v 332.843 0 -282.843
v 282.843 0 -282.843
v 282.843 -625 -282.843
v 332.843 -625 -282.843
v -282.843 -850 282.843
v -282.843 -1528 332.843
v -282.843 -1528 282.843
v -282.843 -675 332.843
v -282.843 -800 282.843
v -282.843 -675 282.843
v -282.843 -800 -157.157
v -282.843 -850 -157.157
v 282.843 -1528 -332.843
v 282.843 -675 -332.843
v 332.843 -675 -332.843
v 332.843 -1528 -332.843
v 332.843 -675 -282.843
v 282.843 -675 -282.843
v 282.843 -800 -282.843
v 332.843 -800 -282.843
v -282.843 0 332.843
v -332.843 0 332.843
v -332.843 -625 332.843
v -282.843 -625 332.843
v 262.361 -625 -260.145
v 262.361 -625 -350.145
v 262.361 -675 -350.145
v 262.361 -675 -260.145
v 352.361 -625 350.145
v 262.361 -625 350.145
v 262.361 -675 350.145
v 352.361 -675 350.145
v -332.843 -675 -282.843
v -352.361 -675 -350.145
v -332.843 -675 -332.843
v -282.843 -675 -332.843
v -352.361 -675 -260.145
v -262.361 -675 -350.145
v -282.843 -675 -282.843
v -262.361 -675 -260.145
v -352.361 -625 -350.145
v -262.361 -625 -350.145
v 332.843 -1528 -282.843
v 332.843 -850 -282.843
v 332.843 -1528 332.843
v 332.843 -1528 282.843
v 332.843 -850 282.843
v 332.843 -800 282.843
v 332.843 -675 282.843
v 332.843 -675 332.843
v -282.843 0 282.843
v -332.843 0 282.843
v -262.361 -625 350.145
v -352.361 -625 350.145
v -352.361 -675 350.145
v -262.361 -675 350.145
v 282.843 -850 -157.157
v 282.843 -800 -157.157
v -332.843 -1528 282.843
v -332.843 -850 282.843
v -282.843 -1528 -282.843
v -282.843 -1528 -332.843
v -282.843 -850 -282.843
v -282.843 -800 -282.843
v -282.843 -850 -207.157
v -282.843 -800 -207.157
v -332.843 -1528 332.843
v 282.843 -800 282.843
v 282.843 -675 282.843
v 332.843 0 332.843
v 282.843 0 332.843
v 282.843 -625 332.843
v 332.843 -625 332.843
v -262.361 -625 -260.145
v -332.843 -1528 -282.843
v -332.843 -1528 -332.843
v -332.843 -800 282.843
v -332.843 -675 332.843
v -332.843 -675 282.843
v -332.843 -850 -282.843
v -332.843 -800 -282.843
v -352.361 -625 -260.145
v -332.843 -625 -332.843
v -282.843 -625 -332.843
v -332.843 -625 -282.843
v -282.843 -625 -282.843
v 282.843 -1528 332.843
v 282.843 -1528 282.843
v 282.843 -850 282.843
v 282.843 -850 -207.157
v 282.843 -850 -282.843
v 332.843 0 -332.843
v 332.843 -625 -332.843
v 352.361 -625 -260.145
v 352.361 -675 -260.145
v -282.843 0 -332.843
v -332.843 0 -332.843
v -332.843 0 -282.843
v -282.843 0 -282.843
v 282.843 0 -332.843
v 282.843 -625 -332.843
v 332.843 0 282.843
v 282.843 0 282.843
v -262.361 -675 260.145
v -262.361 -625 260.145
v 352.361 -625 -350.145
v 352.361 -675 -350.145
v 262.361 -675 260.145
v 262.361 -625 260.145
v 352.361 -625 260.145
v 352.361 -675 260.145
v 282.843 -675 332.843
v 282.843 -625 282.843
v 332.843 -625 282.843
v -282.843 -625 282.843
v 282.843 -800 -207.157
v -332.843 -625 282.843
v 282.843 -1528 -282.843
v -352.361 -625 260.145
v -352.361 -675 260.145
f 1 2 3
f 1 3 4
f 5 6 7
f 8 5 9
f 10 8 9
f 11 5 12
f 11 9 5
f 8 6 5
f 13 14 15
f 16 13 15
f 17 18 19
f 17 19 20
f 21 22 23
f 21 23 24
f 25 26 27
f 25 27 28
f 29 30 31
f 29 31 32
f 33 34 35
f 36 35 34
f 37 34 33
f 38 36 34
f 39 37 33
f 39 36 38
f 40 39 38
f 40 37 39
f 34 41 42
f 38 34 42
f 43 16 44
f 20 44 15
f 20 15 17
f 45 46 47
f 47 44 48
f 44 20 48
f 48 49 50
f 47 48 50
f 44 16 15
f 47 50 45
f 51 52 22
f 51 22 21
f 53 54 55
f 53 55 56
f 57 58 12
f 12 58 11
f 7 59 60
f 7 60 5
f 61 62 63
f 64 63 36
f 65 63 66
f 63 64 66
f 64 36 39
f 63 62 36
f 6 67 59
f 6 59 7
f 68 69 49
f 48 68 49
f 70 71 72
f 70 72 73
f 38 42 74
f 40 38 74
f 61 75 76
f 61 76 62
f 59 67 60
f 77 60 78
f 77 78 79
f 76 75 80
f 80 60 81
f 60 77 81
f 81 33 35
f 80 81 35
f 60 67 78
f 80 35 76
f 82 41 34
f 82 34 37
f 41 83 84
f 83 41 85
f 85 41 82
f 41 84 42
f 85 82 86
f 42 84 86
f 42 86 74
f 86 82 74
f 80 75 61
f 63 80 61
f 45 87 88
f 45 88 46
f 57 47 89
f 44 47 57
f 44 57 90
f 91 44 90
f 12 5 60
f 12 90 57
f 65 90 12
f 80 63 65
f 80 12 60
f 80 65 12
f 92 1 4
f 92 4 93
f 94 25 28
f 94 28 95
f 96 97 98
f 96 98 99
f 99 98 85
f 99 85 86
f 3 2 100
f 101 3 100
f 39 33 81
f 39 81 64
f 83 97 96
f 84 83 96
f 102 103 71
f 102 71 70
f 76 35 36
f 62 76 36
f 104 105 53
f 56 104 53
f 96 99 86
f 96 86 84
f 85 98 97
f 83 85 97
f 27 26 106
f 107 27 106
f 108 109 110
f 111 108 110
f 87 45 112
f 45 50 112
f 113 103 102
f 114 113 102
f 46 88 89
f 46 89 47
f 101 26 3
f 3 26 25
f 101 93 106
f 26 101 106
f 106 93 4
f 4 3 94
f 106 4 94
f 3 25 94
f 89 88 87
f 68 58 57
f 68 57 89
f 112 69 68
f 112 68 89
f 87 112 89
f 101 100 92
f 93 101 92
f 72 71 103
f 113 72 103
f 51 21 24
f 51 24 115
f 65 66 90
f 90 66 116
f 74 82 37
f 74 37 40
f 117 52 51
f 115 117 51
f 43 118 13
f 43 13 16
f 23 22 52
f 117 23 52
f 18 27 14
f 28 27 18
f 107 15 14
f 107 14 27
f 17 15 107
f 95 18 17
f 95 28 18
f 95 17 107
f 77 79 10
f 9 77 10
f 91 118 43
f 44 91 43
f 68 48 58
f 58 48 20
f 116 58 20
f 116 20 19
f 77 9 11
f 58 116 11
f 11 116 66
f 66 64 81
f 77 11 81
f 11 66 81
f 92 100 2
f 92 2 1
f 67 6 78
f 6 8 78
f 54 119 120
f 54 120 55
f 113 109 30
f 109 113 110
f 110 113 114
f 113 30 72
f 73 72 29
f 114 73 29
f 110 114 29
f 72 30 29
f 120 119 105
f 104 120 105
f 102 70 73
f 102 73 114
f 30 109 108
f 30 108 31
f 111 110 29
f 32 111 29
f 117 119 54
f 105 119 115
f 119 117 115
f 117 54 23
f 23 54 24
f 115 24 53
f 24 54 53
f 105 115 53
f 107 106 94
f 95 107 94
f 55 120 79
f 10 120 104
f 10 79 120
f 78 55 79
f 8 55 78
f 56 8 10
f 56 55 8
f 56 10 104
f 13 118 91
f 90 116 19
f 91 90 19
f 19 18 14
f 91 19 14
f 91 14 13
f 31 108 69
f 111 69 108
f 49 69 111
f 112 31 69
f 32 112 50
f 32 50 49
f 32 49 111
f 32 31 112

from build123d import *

# Parameters (mm, degrees)
CROQUIS1_W                = 50
CROQUIS1_H                = 50
SALIENTE_EXTRUIR1_DEPTH   = 625
SALIENTE_EXTRUIR1_2_DEPTH = 625
SALIENTE_EXTRUIR1_3_DEPTH = 625
SALIENTE_EXTRUIR1_4_DEPTH = 625
CROQUIS2_W                = 90
CROQUIS2_H                = 90
SALIENTE_EXTRUIR2_DEPTH   = 50
CROQUIS4_W                = 50
CROQUIS4_H                = 50
SALIENTE_EXTRUIR3_DEPTH   = 853
SALIENTE_EXTRUIR4_DEPTH   = 50


with BuildPart() as part:
    # Croquis1 → Saliente-Extruir1 (new body)
    with BuildSketch(Plane(origin=(0, 0, 0), x_dir=(1, 0, 0), z_dir=(0, 1, 0))):
        with Locations((-307.842712475, 307.842712475)):
            Rectangle(CROQUIS1_W, CROQUIS1_H)
    extrude(amount=-SALIENTE_EXTRUIR1_DEPTH)



with BuildPart() as body_2:
    # Croquis1 → Saliente-Extruir1 2 (new body)
    with BuildSketch(Plane(origin=(0, 0, 0), x_dir=(1, 0, 0), z_dir=(0, 1, 0))):
        with Locations((307.842712475, 307.842712475)):
            Rectangle(CROQUIS1_W, CROQUIS1_H)
    extrude(amount=-SALIENTE_EXTRUIR1_2_DEPTH)


with BuildPart() as body_3:
    # Croquis1 → Saliente-Extruir1 3 (new body)
    with BuildSketch(Plane(origin=(0, 0, 0), x_dir=(1, 0, 0), z_dir=(0, 1, 0))):
        with Locations((-307.842712475, -307.842712475)):
            Rectangle(CROQUIS1_W, CROQUIS1_H)
    extrude(amount=-SALIENTE_EXTRUIR1_3_DEPTH)


with BuildPart() as body_4:
    # Croquis1 → Saliente-Extruir1 4 (new body)
    with BuildSketch(Plane(origin=(0, 0, 0), x_dir=(1, 0, 0), z_dir=(0, 1, 0))):
        with Locations((307.842712475, -307.842712475)):
            Rectangle(CROQUIS1_W, CROQUIS1_H)
    extrude(amount=-SALIENTE_EXTRUIR1_4_DEPTH)


with BuildPart() as part_1:
    add(part.part)

    add(body_2.part)  # Saliente-Extruir2 merges body 2

    add(body_3.part)  # Saliente-Extruir2 merges body 3

    add(body_4.part)  # Saliente-Extruir2 merges body 4
    # Croquis2 → Saliente-Extruir2 (add)
    with BuildSketch(Plane.XZ.offset(625)):
        with Locations((-307.360997504, 305.1451107)):
            Rectangle(CROQUIS2_W, CROQUIS2_H)
        with Locations((307.360997504, 305.1451107)):
            Rectangle(CROQUIS2_W, CROQUIS2_H)
        with Locations((307.360997504, -305.1451107)):
            Rectangle(CROQUIS2_W, CROQUIS2_H)
        with Locations((-307.360997504, -305.1451107)):
            Rectangle(CROQUIS2_W, CROQUIS2_H)
    extrude(amount=SALIENTE_EXTRUIR2_DEPTH)

    # Croquis4 → Saliente-Extruir3 (add)
    with BuildSketch(Plane.XZ.offset(675)):
        with Locations((-307.842712475, 307.842712475)):
            Rectangle(CROQUIS4_W, CROQUIS4_H)
        with Locations((-307.842712475, -307.842712475)):
            Rectangle(CROQUIS4_W, CROQUIS4_H)
        with Locations((307.842712475, 307.842712475)):
            Rectangle(CROQUIS4_W, CROQUIS4_H)
        with Locations((307.842712475, -307.842712475)):
            Rectangle(CROQUIS4_W, CROQUIS4_H)
    extrude(amount=SALIENTE_EXTRUIR3_DEPTH)

    # Croquis6 → Saliente-Extruir4 (add)
    with BuildSketch(Plane(origin=(0, -800, 0), x_dir=(1, 0, 0), z_dir=(0, 1, 0))):
        Polygon((332.842712475, 282.842712475), (332.842712475, -332.842712475), (282.842712475, -332.842712475), (282.842712475, -282.842712475), (282.842712475, 157.157287525), (-282.842712475, 157.157287525), (-282.842712475, -282.842712475), (-282.842712475, -332.842712475), (-332.842712475, -332.842712475), (-332.842712475, 282.842712475), (-282.842712475, 282.842712475), (-282.842712475, 207.157287525), (282.842712475, 207.157287525), (282.842712475, 282.842712475), align=None)
    extrude(amount=-SALIENTE_EXTRUIR4_DEPTH)


solid = part_1.part
